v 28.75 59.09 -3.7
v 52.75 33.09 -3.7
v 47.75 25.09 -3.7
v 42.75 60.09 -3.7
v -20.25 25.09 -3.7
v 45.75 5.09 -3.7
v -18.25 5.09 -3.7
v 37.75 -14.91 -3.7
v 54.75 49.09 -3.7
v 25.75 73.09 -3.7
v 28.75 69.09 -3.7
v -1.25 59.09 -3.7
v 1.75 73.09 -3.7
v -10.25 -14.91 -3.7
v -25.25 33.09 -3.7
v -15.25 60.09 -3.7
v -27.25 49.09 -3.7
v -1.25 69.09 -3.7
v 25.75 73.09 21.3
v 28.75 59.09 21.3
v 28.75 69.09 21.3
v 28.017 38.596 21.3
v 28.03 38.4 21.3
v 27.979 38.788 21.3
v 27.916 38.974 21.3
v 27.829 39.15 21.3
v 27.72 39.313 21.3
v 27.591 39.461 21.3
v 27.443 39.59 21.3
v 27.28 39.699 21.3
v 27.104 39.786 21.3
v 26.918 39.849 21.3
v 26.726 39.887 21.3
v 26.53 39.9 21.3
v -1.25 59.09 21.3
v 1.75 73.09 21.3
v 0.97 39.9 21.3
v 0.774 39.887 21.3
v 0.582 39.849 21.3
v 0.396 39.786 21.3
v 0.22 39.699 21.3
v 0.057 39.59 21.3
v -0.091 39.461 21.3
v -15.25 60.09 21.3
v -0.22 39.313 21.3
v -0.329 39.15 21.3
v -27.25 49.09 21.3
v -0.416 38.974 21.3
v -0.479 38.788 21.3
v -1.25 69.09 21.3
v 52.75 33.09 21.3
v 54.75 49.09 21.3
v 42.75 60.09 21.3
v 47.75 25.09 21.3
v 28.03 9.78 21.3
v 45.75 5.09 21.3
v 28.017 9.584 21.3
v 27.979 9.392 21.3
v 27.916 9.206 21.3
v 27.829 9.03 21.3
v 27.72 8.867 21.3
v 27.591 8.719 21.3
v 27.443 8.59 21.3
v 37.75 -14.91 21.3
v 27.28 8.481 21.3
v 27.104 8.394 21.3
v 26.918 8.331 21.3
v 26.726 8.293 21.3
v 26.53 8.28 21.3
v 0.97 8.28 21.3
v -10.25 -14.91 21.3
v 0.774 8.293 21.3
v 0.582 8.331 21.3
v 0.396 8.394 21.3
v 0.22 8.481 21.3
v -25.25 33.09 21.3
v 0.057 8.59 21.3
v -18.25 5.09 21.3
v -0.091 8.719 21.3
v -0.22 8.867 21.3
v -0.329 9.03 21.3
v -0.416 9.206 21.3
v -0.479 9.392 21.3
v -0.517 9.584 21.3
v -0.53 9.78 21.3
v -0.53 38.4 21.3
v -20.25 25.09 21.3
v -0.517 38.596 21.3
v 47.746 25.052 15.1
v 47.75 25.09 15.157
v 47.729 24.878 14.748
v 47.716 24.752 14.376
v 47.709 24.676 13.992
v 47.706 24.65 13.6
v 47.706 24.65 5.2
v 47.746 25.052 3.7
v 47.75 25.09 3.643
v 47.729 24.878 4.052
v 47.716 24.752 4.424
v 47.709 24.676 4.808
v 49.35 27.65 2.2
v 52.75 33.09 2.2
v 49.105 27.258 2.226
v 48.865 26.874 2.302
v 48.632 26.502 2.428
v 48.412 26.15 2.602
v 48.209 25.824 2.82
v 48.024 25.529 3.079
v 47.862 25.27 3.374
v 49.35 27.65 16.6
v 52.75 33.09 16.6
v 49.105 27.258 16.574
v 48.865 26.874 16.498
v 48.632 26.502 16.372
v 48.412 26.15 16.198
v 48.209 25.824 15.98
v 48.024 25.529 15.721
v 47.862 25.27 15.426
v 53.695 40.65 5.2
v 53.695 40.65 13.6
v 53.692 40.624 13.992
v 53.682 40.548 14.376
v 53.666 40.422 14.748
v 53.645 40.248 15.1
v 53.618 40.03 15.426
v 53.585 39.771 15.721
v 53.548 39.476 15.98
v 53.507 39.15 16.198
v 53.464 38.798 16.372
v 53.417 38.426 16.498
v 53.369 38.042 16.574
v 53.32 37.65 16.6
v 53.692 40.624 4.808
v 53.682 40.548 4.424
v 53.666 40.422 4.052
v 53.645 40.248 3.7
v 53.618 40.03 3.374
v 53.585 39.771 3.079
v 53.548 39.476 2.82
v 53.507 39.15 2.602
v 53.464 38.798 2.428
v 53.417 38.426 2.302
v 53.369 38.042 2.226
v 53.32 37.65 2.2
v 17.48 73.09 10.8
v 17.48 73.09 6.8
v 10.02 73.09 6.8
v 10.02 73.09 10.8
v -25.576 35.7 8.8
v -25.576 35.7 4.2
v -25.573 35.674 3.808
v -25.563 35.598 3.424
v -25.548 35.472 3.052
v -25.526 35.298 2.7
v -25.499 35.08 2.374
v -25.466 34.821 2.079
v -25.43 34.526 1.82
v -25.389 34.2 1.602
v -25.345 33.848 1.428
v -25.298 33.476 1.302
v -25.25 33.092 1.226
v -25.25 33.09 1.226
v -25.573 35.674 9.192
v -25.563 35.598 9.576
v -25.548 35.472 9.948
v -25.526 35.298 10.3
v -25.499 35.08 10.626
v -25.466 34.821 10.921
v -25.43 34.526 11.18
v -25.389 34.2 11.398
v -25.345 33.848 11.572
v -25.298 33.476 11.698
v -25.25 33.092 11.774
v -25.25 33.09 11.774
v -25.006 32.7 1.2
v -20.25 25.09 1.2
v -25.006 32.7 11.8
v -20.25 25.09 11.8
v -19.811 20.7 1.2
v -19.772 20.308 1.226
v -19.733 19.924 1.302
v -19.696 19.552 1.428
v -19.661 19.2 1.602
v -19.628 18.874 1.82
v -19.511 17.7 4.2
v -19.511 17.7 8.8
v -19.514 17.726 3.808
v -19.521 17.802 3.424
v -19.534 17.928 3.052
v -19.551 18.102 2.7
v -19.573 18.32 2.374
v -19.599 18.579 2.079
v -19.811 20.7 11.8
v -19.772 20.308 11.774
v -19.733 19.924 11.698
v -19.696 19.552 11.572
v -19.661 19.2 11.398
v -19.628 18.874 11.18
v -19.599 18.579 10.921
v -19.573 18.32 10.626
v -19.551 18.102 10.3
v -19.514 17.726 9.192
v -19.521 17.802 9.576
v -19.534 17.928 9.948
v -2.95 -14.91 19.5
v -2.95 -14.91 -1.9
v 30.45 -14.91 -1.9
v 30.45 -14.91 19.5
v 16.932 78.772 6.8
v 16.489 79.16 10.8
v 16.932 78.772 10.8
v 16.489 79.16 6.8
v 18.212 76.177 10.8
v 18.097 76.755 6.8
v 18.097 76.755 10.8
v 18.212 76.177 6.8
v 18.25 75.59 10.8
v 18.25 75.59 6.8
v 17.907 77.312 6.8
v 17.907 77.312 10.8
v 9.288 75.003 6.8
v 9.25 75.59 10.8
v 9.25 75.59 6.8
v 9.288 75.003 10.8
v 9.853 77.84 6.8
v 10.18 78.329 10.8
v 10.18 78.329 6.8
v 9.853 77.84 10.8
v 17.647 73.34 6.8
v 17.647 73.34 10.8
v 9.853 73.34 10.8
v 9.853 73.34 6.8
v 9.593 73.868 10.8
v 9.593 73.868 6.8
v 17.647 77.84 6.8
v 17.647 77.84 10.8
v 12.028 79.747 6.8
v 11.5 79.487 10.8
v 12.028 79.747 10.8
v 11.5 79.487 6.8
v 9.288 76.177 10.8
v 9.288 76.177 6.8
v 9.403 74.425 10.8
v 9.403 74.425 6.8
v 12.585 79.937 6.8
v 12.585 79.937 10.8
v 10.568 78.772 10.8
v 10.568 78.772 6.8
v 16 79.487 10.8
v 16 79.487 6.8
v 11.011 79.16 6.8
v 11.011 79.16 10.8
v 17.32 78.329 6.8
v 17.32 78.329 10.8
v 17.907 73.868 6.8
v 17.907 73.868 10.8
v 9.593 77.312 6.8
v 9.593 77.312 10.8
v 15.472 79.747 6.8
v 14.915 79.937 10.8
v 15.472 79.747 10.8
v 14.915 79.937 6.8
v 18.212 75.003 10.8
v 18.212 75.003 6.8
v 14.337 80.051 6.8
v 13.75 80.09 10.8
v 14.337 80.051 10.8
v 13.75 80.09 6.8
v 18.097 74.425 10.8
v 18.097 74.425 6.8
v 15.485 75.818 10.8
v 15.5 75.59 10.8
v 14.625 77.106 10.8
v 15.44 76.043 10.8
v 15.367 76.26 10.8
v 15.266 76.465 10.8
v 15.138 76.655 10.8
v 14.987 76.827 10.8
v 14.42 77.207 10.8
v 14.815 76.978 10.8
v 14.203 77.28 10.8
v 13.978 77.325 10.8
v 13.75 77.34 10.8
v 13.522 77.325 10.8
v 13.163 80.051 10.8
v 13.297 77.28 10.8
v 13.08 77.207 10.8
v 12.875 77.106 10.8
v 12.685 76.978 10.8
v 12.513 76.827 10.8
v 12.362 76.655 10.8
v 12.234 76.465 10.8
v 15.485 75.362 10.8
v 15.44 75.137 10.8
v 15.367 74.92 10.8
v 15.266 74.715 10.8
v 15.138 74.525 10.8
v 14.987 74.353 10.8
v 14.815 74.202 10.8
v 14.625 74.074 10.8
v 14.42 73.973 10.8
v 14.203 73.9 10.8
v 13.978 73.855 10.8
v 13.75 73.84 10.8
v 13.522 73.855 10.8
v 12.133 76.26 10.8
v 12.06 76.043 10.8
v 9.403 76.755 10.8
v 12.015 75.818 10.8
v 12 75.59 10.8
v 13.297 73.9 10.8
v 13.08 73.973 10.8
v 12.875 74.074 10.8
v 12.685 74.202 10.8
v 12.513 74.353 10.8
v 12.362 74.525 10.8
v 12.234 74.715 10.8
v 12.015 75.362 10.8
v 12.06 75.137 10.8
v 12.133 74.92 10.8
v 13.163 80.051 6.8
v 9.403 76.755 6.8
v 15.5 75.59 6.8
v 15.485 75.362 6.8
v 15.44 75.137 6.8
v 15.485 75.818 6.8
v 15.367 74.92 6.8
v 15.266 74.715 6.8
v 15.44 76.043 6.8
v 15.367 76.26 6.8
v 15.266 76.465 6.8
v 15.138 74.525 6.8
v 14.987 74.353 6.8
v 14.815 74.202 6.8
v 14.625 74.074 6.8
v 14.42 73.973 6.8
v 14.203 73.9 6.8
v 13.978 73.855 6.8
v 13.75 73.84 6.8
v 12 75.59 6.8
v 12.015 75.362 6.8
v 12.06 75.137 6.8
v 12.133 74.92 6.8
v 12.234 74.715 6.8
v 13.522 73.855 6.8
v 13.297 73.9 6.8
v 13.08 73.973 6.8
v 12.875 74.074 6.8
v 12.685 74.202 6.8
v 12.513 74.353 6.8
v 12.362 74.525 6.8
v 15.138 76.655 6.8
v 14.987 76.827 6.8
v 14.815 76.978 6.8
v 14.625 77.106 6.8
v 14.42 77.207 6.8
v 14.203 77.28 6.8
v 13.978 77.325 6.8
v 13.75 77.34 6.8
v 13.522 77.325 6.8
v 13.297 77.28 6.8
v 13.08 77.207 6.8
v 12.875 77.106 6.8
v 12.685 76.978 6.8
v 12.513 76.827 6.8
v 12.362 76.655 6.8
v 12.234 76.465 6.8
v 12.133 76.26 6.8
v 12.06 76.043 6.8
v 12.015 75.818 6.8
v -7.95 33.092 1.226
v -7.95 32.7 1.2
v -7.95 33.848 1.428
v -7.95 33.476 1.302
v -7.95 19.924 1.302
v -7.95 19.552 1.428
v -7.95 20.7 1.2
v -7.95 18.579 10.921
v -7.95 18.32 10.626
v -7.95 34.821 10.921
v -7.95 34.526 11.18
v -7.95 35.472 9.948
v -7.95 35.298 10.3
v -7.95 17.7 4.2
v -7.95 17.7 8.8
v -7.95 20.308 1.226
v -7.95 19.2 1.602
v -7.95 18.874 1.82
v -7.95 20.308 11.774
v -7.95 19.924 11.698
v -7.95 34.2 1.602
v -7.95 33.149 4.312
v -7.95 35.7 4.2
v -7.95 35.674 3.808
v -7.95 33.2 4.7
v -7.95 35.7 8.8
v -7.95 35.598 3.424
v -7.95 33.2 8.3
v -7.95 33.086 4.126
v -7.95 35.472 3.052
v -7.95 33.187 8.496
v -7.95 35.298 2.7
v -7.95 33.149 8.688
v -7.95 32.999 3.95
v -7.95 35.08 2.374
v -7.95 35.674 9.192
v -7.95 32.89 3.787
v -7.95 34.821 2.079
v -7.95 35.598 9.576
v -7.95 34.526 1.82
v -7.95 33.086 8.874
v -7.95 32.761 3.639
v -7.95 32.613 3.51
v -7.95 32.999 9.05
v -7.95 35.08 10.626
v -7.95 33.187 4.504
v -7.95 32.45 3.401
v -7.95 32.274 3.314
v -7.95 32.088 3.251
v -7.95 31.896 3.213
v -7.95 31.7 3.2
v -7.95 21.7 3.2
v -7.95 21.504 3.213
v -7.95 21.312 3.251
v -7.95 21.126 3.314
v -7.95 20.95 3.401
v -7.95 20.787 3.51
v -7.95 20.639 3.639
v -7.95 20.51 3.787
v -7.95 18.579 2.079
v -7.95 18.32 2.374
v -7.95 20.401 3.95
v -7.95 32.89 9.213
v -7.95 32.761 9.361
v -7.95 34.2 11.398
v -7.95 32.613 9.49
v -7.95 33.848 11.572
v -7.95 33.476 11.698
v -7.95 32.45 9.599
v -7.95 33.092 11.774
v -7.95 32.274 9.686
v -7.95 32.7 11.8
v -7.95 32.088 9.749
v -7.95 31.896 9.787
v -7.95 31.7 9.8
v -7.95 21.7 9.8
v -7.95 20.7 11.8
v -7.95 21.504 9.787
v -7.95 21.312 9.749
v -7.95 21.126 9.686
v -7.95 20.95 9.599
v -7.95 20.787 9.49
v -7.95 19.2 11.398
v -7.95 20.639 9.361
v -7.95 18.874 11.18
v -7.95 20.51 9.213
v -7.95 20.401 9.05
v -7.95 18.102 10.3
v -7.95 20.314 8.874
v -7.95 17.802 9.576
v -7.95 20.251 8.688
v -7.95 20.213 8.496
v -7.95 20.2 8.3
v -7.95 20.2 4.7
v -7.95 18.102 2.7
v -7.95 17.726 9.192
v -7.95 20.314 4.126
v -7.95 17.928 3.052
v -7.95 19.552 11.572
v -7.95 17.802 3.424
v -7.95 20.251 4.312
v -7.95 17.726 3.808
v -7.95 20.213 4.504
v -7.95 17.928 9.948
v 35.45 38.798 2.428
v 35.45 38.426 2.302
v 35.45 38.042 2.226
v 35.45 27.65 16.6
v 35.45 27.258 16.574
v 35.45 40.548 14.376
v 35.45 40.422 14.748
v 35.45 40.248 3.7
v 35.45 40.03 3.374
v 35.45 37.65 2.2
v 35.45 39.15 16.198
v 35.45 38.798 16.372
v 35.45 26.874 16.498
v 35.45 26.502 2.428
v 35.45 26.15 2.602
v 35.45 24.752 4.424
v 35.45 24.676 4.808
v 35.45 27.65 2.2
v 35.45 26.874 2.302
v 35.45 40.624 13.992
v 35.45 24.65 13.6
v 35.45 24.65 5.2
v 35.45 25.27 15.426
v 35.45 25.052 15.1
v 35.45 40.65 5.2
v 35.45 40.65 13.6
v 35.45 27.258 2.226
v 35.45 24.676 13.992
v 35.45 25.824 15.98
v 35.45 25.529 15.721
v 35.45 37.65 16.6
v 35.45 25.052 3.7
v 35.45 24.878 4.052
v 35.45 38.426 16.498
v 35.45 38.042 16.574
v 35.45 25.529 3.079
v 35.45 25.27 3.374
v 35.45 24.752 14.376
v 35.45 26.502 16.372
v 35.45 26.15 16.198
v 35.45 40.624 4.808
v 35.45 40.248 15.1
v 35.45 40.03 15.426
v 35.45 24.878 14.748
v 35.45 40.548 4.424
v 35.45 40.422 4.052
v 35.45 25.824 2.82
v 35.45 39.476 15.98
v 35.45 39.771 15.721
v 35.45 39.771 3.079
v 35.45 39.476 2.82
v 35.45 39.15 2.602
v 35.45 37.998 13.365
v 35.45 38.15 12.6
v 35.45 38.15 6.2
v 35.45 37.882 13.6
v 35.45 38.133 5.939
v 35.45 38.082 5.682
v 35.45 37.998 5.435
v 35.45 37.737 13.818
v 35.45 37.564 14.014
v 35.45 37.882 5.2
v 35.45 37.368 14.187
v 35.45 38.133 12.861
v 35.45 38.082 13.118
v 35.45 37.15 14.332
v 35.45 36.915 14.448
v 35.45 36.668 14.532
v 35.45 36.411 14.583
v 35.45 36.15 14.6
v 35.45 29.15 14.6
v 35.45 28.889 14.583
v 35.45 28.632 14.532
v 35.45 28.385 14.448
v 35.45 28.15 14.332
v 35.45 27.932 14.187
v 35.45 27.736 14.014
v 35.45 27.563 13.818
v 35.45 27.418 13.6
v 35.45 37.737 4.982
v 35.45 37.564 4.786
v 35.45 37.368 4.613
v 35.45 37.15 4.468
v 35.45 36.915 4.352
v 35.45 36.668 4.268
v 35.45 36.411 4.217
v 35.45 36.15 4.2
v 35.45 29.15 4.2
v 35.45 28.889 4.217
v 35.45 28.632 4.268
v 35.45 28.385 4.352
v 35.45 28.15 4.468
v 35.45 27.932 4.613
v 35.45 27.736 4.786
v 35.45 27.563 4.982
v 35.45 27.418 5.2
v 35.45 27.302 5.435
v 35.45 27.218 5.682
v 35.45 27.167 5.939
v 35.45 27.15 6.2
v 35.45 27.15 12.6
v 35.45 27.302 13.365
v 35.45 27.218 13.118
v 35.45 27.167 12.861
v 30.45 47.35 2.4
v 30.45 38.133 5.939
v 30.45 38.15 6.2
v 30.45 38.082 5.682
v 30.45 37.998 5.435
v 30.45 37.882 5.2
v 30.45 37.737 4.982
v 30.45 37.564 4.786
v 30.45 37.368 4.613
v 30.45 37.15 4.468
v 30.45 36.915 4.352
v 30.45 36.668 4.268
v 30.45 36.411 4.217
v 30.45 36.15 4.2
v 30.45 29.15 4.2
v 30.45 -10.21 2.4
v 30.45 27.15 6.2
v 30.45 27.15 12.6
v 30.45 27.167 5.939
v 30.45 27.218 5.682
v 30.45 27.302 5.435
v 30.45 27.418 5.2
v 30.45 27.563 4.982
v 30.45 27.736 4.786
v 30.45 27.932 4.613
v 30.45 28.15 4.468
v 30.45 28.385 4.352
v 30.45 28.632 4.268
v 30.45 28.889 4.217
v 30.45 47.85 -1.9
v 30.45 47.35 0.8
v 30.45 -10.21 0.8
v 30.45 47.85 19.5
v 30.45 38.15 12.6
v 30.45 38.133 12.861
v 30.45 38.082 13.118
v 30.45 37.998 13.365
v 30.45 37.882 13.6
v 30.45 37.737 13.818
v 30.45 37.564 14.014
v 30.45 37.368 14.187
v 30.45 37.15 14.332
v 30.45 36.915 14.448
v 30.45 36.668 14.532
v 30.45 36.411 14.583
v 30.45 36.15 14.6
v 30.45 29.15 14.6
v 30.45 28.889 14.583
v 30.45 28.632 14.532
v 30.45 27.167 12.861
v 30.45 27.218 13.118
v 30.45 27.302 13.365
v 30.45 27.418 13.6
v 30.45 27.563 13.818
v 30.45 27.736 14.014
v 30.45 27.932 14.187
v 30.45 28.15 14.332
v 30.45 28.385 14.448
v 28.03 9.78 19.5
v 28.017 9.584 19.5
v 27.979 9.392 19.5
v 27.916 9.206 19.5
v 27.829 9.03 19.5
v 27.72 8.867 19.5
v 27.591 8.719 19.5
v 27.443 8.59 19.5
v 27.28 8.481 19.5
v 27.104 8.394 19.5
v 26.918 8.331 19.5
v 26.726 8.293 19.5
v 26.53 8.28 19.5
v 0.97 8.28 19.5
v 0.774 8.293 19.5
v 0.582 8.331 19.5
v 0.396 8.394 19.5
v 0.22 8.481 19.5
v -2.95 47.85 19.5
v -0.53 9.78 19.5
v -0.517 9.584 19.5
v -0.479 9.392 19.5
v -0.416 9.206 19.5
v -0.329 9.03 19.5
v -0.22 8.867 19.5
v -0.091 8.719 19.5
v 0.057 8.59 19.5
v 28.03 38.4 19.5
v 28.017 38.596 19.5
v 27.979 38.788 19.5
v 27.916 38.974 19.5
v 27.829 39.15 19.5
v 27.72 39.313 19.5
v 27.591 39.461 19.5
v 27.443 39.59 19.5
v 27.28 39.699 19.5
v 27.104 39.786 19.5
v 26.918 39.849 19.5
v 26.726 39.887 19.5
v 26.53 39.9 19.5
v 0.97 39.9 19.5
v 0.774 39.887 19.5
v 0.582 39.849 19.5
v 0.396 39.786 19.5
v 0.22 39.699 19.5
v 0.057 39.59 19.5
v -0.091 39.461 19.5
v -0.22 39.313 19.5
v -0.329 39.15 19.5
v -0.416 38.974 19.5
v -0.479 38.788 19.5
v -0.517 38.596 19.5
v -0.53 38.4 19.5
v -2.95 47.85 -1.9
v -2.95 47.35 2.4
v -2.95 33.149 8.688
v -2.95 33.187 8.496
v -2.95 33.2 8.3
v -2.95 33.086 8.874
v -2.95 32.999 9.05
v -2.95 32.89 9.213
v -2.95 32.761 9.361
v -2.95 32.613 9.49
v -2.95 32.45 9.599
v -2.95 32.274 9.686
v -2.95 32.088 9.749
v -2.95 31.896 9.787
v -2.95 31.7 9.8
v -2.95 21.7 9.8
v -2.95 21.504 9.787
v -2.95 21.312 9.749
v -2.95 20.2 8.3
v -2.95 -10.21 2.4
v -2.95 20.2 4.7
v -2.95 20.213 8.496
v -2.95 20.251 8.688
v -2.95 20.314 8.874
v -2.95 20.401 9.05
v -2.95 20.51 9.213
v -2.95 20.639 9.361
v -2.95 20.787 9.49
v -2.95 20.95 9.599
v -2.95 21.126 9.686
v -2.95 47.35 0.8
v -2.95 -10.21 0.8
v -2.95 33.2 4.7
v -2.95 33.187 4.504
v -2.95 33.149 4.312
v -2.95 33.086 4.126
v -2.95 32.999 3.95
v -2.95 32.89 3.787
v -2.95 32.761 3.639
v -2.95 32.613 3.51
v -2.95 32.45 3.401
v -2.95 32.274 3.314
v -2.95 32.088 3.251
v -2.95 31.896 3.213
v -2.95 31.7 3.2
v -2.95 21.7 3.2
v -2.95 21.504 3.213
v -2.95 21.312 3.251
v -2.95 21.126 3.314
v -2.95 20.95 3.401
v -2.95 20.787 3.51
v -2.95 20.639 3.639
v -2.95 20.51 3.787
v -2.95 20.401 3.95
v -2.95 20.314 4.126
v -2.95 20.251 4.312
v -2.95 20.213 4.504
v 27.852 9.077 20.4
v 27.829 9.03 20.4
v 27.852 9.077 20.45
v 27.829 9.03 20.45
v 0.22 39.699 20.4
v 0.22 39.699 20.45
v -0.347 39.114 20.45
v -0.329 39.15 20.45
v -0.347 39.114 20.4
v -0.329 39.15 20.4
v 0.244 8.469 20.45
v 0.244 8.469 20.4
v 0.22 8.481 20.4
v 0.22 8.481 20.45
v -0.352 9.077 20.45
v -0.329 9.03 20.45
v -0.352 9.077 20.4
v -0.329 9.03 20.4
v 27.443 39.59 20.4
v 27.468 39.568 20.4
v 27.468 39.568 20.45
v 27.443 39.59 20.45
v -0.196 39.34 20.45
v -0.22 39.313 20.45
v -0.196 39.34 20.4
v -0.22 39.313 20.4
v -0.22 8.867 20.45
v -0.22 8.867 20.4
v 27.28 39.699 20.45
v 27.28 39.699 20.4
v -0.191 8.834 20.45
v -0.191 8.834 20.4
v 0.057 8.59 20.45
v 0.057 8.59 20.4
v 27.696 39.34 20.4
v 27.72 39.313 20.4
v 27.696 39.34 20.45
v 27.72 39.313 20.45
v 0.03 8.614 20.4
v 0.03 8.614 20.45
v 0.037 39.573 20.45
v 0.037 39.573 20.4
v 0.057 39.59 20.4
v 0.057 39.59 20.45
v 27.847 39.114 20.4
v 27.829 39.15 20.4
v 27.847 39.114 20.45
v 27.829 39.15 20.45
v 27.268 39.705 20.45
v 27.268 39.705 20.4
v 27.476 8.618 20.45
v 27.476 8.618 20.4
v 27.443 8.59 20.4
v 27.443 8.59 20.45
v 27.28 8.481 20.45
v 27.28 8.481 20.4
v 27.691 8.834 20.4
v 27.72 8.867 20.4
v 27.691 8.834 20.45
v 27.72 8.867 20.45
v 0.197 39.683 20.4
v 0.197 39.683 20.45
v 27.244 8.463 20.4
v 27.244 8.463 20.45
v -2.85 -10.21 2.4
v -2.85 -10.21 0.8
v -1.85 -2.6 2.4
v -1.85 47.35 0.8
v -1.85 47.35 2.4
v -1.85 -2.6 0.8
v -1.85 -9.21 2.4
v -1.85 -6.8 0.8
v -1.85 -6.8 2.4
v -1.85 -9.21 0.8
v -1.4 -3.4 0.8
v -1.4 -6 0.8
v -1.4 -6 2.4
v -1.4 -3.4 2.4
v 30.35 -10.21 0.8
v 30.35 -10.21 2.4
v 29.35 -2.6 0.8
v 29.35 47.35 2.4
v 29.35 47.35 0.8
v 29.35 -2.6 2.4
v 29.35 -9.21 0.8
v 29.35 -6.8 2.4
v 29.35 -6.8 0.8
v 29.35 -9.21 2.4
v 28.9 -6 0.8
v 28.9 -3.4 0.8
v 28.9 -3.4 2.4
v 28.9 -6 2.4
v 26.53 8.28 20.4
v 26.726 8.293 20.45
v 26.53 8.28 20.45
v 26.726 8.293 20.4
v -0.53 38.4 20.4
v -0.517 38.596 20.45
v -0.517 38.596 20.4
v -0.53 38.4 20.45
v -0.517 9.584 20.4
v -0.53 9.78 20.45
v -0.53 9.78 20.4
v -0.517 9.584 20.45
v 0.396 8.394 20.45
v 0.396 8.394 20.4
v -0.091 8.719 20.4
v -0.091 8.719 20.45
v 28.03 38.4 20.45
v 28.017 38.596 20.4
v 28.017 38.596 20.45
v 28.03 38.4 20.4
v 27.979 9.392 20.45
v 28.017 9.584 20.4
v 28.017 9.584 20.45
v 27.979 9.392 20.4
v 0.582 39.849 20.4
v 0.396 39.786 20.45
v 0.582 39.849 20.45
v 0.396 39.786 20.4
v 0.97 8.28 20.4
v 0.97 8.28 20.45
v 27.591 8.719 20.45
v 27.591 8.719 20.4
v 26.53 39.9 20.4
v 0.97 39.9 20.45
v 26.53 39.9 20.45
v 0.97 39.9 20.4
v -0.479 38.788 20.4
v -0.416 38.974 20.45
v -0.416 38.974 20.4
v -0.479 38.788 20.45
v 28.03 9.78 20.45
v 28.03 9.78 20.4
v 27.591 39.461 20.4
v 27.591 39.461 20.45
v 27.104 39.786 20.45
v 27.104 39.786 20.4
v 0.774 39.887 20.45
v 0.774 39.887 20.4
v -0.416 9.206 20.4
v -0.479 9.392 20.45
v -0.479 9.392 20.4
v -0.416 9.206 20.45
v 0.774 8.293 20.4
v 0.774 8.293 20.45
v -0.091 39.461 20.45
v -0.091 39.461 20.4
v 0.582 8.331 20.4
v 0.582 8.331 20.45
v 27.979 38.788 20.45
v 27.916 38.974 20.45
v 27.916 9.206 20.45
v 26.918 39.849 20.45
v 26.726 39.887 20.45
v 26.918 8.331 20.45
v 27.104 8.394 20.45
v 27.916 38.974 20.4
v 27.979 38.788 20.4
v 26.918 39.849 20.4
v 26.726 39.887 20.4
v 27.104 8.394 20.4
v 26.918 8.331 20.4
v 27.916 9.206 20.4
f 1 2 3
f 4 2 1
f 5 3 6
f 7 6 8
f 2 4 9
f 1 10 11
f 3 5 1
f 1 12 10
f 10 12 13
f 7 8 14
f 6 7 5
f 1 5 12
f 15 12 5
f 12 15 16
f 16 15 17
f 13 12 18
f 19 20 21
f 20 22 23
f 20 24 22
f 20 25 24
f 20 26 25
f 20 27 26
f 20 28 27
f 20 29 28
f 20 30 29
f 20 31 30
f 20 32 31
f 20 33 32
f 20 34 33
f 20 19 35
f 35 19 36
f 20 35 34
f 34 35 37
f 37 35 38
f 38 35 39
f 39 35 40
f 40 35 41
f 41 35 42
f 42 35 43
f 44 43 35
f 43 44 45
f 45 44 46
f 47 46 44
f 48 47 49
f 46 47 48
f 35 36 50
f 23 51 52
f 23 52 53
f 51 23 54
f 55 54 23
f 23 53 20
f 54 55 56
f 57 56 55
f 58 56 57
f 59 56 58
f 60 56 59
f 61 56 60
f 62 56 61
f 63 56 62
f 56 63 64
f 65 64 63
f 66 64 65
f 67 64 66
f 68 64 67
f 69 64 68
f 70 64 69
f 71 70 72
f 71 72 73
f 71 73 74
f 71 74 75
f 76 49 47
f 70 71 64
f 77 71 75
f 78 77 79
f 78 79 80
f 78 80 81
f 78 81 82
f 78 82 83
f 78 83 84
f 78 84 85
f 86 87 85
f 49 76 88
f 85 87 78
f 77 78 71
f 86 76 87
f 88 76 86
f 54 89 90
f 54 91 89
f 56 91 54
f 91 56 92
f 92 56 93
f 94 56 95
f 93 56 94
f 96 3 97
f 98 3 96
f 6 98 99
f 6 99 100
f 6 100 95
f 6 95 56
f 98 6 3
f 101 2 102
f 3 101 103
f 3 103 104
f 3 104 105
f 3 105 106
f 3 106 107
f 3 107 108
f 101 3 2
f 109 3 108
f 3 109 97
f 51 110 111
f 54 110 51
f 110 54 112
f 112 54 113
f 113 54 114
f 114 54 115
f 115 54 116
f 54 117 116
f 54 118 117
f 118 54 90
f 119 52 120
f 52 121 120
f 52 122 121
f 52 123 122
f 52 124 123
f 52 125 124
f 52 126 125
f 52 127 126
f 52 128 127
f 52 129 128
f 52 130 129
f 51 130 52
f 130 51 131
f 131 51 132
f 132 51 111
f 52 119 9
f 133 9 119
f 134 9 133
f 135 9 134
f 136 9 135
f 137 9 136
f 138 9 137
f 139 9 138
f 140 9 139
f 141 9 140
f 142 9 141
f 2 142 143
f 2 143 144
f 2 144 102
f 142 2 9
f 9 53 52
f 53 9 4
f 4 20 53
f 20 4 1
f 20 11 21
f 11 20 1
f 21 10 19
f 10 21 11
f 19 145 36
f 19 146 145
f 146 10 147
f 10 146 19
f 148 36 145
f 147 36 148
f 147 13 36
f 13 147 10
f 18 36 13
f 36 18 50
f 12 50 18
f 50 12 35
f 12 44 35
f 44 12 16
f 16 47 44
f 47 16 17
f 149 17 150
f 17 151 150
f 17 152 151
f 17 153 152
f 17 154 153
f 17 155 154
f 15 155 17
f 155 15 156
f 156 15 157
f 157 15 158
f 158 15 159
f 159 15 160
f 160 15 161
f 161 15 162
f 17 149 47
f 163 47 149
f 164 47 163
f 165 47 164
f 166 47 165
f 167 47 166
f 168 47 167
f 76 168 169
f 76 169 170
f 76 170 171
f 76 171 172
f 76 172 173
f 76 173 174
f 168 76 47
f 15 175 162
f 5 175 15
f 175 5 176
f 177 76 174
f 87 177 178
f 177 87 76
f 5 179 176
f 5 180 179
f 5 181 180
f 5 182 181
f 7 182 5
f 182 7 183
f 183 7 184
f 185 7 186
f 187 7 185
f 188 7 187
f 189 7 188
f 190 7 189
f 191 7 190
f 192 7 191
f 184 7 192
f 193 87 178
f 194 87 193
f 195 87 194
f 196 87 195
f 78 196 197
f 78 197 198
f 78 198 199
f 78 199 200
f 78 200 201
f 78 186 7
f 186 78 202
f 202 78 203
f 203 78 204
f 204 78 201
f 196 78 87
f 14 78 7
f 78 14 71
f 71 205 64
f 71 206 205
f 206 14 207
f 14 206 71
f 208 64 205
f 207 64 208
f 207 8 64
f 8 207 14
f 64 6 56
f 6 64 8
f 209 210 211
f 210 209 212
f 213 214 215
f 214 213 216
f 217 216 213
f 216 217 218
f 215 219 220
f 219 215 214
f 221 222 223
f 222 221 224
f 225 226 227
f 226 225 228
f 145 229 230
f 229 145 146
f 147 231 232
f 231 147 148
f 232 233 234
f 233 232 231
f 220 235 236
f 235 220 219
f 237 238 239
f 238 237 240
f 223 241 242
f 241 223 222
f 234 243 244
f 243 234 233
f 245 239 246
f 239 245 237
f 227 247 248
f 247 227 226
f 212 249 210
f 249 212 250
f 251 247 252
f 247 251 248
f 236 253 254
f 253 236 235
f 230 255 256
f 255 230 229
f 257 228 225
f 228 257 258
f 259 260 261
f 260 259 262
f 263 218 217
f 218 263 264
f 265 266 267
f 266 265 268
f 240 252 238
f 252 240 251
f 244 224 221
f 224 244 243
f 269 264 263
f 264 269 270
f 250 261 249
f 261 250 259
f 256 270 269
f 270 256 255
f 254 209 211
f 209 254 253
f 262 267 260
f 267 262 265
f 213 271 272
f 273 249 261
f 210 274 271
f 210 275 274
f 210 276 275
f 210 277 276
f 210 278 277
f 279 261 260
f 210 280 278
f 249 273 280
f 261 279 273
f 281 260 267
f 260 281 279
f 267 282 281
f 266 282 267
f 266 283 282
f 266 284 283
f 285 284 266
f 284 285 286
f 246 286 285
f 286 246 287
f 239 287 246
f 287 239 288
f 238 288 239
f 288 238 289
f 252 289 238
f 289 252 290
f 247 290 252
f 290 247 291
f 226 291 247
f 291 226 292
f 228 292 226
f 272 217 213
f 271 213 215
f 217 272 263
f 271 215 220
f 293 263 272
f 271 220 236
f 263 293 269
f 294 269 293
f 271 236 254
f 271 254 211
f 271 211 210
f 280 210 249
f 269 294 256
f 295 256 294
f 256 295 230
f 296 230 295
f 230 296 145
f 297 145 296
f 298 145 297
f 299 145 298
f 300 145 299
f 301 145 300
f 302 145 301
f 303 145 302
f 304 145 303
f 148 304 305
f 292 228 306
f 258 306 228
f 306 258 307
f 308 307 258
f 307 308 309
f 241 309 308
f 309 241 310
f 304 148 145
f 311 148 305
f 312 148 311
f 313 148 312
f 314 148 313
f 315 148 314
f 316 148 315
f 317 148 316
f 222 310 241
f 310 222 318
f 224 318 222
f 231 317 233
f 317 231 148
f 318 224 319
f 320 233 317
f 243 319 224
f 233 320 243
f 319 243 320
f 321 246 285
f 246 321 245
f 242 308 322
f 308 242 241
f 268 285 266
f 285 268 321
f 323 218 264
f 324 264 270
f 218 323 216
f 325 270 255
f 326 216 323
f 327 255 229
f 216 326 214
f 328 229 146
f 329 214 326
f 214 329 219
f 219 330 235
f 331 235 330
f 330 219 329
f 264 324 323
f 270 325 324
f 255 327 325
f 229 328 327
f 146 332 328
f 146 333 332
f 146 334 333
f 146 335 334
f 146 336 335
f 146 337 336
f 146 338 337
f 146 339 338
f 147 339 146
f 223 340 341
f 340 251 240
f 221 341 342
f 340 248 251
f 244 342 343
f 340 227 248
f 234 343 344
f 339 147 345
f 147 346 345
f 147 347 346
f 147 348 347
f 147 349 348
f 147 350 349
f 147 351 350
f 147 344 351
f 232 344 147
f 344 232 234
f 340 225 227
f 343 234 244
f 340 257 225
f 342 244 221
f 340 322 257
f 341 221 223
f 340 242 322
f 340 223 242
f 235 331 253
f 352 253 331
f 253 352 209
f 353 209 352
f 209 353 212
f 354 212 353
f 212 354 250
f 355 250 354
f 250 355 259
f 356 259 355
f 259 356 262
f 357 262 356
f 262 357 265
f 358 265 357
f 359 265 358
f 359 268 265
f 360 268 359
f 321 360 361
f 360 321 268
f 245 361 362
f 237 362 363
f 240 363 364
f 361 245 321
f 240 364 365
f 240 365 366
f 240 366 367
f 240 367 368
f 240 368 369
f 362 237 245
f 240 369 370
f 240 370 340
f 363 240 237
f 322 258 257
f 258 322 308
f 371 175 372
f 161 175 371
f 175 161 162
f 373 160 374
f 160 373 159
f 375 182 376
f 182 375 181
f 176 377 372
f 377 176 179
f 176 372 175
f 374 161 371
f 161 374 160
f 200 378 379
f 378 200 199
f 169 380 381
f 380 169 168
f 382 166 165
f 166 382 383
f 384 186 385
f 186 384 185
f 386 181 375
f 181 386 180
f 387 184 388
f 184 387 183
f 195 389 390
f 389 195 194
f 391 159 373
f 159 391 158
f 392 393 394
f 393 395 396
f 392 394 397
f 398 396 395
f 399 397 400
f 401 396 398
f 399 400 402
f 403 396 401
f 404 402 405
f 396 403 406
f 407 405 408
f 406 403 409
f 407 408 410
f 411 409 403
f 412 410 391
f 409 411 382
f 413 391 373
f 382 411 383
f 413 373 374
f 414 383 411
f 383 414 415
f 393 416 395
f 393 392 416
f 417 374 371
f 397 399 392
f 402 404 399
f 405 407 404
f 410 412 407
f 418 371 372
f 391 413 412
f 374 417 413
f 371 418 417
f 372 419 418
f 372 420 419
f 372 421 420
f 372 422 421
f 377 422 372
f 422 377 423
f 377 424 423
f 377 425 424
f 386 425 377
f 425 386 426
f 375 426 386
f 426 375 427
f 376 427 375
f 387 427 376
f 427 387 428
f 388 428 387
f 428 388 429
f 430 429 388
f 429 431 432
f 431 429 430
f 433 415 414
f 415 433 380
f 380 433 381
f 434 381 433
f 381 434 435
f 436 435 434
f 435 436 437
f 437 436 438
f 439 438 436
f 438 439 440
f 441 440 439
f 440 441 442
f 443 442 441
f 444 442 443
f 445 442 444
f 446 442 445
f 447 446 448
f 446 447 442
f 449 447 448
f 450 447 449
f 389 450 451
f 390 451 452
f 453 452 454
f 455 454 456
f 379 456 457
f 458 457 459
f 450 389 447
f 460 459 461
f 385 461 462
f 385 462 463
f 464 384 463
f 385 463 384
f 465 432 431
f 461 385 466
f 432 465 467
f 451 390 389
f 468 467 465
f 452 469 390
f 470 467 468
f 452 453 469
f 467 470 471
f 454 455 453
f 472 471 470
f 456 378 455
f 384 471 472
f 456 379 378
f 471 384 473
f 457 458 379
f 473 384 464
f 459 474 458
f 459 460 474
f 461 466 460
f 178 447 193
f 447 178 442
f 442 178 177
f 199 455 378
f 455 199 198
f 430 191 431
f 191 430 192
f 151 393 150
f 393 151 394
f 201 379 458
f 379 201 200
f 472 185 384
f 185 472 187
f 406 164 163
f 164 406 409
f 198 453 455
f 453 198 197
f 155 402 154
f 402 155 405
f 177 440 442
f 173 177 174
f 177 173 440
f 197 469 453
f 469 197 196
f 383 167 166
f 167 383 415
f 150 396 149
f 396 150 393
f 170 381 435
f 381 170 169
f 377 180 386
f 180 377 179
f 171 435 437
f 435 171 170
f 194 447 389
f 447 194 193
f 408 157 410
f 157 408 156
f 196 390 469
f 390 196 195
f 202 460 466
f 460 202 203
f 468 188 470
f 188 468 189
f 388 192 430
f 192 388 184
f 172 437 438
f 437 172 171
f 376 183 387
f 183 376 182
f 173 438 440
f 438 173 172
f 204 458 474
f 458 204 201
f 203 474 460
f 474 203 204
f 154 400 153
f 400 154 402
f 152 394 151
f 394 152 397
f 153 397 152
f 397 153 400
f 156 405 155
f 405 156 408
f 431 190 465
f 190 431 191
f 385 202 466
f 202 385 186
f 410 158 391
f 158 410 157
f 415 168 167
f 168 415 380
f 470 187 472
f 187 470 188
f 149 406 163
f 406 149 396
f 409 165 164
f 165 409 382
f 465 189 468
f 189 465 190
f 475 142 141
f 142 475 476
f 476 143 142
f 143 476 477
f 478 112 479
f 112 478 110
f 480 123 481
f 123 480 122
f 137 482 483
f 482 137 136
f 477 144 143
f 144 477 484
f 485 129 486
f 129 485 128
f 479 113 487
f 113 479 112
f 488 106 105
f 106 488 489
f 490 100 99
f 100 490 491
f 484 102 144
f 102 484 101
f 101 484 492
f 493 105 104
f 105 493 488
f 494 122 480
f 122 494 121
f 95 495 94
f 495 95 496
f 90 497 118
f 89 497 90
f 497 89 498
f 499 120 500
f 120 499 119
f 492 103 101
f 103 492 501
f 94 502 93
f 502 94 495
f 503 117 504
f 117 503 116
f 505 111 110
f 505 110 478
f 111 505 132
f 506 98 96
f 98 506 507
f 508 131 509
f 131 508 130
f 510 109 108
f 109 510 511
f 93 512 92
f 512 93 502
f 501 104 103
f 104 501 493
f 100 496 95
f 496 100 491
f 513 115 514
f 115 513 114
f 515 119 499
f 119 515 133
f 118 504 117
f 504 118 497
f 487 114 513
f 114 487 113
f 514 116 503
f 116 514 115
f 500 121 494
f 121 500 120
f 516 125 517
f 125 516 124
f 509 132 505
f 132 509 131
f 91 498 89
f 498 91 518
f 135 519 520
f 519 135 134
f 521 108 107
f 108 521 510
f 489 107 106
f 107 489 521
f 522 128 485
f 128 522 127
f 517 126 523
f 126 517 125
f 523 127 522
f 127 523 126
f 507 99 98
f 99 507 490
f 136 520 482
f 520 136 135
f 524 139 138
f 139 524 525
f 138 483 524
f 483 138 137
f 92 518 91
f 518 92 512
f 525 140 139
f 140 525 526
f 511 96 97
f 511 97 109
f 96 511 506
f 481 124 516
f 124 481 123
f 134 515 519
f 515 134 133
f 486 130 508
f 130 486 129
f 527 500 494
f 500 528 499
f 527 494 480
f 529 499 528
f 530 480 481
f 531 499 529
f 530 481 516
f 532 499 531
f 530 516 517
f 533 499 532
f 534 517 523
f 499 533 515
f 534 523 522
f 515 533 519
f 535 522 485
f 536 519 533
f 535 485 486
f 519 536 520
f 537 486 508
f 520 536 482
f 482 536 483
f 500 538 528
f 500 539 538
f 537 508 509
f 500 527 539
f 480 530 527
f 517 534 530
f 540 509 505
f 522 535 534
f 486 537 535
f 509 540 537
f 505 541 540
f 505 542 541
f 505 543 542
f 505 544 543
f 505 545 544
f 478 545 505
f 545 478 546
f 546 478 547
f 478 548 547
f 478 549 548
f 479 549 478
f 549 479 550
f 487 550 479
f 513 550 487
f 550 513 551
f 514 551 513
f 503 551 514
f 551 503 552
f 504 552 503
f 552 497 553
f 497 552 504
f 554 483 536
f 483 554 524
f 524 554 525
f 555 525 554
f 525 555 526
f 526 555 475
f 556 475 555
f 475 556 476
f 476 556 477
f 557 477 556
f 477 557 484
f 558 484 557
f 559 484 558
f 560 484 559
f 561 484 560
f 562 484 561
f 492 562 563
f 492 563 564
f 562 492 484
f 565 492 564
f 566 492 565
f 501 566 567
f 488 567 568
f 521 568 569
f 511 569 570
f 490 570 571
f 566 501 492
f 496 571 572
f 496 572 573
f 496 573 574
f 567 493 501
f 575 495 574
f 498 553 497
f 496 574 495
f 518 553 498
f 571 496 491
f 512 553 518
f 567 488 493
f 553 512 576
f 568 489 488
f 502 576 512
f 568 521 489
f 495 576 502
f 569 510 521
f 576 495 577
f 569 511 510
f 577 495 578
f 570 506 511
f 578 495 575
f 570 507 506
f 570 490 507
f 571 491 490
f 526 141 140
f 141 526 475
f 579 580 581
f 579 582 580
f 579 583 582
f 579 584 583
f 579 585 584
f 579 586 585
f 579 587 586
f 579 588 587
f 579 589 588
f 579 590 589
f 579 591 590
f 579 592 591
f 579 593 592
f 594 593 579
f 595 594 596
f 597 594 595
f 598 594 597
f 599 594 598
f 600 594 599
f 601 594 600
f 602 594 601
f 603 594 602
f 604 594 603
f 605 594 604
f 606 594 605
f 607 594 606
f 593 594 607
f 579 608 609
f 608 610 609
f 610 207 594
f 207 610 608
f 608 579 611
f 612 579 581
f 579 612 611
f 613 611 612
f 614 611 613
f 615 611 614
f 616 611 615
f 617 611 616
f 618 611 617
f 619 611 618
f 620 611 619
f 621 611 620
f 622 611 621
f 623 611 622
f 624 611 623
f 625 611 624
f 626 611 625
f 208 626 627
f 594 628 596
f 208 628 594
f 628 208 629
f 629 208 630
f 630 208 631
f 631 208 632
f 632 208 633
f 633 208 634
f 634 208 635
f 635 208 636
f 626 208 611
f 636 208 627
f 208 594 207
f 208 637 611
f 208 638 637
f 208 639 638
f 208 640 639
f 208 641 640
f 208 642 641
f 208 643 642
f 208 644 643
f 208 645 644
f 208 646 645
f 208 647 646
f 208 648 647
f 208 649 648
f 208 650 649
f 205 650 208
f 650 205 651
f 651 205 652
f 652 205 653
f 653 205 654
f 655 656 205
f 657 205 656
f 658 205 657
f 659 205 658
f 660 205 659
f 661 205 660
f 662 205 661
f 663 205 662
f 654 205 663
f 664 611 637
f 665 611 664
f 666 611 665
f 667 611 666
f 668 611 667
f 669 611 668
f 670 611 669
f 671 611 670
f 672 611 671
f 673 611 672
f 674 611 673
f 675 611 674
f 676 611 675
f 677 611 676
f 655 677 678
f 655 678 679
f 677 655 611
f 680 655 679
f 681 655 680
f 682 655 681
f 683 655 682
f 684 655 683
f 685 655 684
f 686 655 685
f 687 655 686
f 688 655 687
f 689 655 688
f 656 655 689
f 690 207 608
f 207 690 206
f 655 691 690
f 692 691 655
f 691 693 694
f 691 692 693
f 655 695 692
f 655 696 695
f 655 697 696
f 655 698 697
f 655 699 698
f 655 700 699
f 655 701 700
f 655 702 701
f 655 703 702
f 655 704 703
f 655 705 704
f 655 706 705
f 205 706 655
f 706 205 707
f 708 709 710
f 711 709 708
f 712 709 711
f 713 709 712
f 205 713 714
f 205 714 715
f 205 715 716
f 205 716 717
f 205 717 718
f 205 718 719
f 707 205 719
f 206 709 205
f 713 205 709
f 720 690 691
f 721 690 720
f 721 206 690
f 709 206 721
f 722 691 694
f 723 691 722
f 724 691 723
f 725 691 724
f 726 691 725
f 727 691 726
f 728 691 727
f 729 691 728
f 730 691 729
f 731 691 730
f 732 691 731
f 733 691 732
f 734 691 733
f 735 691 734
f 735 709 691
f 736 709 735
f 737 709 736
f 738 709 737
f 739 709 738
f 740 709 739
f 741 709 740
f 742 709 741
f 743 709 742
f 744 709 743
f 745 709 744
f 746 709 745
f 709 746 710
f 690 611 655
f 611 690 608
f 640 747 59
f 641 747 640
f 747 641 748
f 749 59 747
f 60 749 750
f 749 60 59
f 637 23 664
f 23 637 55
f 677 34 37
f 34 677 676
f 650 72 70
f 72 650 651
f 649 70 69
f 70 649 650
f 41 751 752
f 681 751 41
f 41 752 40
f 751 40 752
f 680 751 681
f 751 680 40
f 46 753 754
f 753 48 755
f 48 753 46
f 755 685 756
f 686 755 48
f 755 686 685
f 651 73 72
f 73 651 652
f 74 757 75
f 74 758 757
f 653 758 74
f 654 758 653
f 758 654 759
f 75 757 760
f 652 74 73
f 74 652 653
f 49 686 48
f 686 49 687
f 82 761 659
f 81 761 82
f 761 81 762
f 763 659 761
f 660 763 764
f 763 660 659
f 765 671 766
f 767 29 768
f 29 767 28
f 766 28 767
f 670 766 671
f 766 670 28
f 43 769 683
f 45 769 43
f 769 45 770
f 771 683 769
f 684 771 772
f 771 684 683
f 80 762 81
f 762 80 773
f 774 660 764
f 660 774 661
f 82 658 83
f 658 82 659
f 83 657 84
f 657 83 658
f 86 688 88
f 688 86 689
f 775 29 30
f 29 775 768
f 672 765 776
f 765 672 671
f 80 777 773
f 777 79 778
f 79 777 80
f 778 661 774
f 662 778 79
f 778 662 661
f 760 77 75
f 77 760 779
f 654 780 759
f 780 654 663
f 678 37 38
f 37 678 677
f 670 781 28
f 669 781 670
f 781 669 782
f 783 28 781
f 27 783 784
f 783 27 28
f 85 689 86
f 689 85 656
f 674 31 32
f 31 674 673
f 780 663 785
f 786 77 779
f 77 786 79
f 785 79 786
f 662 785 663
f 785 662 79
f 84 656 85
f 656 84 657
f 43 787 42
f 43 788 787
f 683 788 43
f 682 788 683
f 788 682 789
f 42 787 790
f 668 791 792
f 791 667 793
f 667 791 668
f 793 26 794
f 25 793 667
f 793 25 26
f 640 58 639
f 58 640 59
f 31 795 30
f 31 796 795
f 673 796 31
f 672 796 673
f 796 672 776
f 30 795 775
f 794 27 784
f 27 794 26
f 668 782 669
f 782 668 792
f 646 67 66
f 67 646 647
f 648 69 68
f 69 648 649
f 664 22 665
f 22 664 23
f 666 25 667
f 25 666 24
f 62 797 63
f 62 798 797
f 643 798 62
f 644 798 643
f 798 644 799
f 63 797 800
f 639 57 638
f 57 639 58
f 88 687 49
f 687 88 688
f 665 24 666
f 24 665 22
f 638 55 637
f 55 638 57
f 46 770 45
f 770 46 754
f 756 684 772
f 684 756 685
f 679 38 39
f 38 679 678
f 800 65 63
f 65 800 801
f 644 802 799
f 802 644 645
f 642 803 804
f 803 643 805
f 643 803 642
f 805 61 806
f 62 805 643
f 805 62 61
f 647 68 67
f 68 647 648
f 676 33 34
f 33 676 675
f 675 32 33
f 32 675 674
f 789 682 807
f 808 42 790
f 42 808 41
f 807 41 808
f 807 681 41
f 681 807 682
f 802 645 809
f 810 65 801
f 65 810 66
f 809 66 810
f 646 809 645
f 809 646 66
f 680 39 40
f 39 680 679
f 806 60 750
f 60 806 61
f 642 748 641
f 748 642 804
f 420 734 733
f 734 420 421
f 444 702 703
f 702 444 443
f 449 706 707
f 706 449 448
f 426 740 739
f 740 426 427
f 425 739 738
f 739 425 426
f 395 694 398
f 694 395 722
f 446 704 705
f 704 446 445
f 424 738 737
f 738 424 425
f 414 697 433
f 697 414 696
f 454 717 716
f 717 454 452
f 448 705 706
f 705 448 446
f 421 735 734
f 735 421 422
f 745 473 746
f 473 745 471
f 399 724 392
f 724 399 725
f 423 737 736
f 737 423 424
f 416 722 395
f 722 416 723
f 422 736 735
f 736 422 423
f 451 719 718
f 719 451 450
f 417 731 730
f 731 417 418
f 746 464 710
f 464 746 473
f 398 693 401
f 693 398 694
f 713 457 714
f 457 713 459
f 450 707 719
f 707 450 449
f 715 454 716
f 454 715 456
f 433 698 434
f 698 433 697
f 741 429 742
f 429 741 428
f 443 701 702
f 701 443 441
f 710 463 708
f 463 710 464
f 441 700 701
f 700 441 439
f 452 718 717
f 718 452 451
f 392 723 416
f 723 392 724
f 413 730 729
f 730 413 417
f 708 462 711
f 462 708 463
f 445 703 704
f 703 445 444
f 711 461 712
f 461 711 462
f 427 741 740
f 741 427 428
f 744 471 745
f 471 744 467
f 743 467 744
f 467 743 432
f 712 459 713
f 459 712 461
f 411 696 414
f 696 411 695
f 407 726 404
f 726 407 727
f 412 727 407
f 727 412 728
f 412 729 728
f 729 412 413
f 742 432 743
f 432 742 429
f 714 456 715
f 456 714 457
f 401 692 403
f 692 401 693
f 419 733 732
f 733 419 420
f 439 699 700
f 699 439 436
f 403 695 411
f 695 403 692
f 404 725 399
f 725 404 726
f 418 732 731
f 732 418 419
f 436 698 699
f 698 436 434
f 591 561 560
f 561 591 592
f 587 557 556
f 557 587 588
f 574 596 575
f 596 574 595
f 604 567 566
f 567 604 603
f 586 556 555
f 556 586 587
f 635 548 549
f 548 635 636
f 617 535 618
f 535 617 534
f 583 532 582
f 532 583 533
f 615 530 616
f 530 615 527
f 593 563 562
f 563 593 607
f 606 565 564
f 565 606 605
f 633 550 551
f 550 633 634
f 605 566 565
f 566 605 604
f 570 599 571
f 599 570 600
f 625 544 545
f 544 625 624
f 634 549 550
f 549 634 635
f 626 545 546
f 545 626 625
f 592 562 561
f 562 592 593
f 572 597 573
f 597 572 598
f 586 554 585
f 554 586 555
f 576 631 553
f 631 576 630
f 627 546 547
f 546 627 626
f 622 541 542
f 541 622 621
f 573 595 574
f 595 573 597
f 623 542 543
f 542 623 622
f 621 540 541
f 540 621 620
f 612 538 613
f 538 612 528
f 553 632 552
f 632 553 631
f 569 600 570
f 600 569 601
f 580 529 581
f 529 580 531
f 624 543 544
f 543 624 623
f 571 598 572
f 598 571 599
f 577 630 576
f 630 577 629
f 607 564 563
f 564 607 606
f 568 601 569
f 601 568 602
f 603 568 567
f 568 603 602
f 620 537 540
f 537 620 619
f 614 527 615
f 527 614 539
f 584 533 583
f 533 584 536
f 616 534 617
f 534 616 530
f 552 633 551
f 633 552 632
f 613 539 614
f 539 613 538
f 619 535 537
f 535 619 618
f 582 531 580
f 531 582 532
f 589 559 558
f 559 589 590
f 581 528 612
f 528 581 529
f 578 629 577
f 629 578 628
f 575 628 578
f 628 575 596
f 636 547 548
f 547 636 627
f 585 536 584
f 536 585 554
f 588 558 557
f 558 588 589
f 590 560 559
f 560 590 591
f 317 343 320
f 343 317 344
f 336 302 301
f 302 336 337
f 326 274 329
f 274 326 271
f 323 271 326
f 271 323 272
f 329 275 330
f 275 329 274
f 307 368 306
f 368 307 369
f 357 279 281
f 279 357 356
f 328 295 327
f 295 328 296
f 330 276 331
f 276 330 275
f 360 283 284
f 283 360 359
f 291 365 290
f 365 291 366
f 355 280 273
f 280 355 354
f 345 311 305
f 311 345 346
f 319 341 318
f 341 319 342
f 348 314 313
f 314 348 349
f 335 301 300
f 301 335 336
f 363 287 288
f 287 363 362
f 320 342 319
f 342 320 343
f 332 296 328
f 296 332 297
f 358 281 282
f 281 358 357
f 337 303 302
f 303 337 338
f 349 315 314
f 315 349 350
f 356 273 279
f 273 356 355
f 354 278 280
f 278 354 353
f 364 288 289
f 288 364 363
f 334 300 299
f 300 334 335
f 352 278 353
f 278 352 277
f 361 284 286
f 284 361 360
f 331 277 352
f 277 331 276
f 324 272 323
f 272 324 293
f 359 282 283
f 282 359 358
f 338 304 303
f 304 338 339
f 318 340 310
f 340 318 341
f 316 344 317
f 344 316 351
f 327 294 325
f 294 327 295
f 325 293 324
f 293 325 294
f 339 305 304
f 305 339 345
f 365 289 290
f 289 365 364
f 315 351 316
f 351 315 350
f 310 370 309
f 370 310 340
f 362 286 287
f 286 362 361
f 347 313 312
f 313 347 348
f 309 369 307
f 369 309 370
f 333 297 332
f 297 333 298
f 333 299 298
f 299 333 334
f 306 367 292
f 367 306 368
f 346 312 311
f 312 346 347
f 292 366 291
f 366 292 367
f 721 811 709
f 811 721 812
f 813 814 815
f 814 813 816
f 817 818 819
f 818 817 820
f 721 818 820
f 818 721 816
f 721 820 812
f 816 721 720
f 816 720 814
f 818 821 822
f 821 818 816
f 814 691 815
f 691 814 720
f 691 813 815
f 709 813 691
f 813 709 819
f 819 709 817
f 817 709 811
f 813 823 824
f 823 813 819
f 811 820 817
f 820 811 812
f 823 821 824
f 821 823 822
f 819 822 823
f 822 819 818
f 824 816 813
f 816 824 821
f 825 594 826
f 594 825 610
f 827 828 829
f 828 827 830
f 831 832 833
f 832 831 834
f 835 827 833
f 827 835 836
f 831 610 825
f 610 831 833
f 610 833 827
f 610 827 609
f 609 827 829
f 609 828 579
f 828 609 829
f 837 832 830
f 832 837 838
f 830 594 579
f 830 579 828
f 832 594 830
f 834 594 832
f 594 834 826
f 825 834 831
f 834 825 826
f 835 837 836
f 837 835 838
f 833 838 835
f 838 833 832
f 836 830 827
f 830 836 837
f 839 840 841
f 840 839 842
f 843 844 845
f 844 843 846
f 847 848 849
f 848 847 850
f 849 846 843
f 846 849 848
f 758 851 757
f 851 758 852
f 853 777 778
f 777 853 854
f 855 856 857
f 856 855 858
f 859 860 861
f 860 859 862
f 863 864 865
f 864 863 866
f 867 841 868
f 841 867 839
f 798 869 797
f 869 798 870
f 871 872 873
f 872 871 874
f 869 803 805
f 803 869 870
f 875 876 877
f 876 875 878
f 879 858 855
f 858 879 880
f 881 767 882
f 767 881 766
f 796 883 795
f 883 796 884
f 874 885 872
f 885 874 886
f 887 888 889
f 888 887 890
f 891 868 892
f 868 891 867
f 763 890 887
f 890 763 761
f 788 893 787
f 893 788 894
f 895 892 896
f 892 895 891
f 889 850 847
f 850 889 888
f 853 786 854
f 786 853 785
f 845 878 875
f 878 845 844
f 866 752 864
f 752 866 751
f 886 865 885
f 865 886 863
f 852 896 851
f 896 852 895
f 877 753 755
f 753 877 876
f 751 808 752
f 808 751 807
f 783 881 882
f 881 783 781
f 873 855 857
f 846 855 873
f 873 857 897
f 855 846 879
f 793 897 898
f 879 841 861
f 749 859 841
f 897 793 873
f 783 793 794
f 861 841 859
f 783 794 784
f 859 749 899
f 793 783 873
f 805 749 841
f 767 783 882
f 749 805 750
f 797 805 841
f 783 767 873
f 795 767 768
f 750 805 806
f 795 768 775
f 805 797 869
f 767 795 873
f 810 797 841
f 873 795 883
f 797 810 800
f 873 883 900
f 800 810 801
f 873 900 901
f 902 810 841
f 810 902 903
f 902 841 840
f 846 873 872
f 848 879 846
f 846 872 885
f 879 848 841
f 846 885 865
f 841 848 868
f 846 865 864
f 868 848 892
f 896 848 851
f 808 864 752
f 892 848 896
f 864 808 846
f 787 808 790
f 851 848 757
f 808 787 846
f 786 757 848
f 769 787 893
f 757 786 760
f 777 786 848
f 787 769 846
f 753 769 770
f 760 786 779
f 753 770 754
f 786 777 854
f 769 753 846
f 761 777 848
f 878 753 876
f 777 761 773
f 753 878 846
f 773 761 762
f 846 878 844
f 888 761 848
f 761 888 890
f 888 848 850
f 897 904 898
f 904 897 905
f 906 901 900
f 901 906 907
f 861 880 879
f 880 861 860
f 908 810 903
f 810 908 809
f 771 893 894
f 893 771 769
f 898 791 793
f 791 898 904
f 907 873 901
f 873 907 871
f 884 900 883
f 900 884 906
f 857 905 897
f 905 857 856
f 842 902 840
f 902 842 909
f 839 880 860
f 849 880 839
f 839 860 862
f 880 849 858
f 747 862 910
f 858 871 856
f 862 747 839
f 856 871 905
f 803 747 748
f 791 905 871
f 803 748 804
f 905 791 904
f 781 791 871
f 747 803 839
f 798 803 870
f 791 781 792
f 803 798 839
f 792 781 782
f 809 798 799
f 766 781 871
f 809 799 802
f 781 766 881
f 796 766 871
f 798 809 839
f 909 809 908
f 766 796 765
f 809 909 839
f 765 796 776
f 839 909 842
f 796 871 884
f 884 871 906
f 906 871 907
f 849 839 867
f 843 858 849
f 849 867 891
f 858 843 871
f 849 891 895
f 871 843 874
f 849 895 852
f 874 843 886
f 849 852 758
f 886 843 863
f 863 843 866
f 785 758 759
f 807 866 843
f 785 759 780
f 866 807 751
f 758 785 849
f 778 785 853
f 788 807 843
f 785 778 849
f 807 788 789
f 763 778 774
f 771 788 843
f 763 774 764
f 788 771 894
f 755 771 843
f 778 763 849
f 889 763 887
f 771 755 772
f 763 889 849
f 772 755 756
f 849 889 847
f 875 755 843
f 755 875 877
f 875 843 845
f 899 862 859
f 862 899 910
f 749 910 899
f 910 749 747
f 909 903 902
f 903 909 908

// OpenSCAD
// file: xmas_orn_case.scad
// Forward archived designs to the unchanged shared core one directory above.
include <../xmas_orn_case.scad>
// main file
// Iron Man v7: V5 chest with a trapezoid arc-reactor frame and an extended collar.
// Earlier versions are preserved. The full rectangular display remains unobstructed.
// part: ironman_v7 | body/gold/black/white[_print] | check_core/colours/backing
include <xmas_orn_case.scad>
part = "ironman_v7";
preview_display = true;
im_cx = (glass_x0 + glass_x1)/2;
im_cy = (glass_y0 + glass_y1)/2 - 4;
im_bottom = -35;
im_top = 53;
im_inlay = 0.8;
im_names = ["body", "gold", "black", "white"];
im_colours = ["#ae2232", "#d9ae57", "#252a34", "#e9faff"];

module im_pair() { children(); mirror([1,0,0]) children(); }
module im_line(points,w=1.2) for (i=[0:len(points)-2]) hull() {
    translate(points[i]) circle(d=w,$fn=16);
    translate(points[i+1]) circle(d=w,$fn=16);
}
module im_window() translate([0,4]) offset(r = 1.5)
    square([glass_w+2*front_win_margin-3, glass_l+2*front_win_margin-3], center = true);
module im_outline() polygon([
    [-12,53],[12,53],[15,49],[15,39],[29,40],[41,29],[39,13],[34,5],
    [32,-15],[24,-35],[-24,-35],[-32,-15],[-34,5],[-39,13],
    [-41,29],[-29,40],[-15,39],[-15,49]]);
// Wide across the top, tapered at the bottom; the inner rim clears all screen corners.
module im_reactor() polygon([[-30,26],[30,26],[18.5,-20],[-18.5,-20]]);
module im_gold() {
    im_pair() polygon([[31,9],[34,13],[32,-13],[25,-28],[25,-20],[29,-10]]);
    // A restrained gold collar wraps the dark throat insert.
    polygon([[-13,49],[13,49],[13,40],[9,35],[-9,35],[-13,40]]);
}
module im_black() {
    offset(delta=1.6) im_reactor();
    polygon([[-10,49],[10,49],[10,41],[7,38],[-7,38],[-10,41]]);
    im_pair() {
        im_line([[14,31],[25,34],[35,29]],1.1);
        im_line([[36,22],[35,16]],1.1);
    }
    im_line([[-19,-28],[-13,-25],[13,-25],[19,-28]],1.1);
}
module im_white() difference() {
    im_reactor();
    offset(delta=-2.2) im_reactor();
}

module im_raw(c) {
    if (c == 1) im_gold();
    if (c == 2) im_black();
    if (c == 3) im_white();
}
module im_ink(c) difference() {
    intersection() { im_outline(); im_raw(c); }
    if (c < 3) for (k = [c+1:3]) im_raw(k);
}
module im_body() {
    difference() {
        union() {
            translate([im_cx,im_cy,sz0]) linear_extrude(sz1-sz0) im_outline();
            hang_loop(im_cx,im_cy+im_top);
        }
        hang_loop_hole(im_cx,im_cy+im_top);
        sleeve_cuts(ext = 40, finger = true);
        translate([im_cx,im_cy,sz1-im_inlay]) linear_extrude(im_inlay+eps)
            for (c = [1:3]) im_raw(c);
    }
    sleeve_rails();
}
module im_colour(c) difference() {
    translate([im_cx,im_cy,sz1-im_inlay]) linear_extrude(im_inlay) im_ink(c);
    sleeve_cuts(ext = 40, finger = true);
}
module im_piece(c) { if (c == 0) im_body(); else im_colour(c); }
module im_solid() union() for (c = [0:3]) im_piece(c);
module im_stand() translate([0,0,-(im_cy+im_bottom)]) rotate([90,0,0]) children();

if (part == "ironman_v7") {
    for (c = [0:3]) color(im_colours[c]) render() im_piece(c);
    if (preview_display) color("#101a25") translate([im_cx,im_cy,sz1-im_inlay-0.1])
        linear_extrude(0.05) im_window();
}
for (c = [0:3]) {
    if (part == im_names[c]) im_piece(c);
    if (part == str(im_names[c],"_print")) im_stand() im_piece(c);
}
if (part == "check_core") intersection() { im_solid(); union() { core_tray(); core_bezel(); } }
if (part == "check_colours") for (a = [0:2], b = [a+1:3])
    intersection() { im_piece(a); im_piece(b); }
if (part == "check_backing") difference() {
    translate([0,0,-im_inlay]) union() for (c = [1:3]) im_colour(c);
    im_body();
}
